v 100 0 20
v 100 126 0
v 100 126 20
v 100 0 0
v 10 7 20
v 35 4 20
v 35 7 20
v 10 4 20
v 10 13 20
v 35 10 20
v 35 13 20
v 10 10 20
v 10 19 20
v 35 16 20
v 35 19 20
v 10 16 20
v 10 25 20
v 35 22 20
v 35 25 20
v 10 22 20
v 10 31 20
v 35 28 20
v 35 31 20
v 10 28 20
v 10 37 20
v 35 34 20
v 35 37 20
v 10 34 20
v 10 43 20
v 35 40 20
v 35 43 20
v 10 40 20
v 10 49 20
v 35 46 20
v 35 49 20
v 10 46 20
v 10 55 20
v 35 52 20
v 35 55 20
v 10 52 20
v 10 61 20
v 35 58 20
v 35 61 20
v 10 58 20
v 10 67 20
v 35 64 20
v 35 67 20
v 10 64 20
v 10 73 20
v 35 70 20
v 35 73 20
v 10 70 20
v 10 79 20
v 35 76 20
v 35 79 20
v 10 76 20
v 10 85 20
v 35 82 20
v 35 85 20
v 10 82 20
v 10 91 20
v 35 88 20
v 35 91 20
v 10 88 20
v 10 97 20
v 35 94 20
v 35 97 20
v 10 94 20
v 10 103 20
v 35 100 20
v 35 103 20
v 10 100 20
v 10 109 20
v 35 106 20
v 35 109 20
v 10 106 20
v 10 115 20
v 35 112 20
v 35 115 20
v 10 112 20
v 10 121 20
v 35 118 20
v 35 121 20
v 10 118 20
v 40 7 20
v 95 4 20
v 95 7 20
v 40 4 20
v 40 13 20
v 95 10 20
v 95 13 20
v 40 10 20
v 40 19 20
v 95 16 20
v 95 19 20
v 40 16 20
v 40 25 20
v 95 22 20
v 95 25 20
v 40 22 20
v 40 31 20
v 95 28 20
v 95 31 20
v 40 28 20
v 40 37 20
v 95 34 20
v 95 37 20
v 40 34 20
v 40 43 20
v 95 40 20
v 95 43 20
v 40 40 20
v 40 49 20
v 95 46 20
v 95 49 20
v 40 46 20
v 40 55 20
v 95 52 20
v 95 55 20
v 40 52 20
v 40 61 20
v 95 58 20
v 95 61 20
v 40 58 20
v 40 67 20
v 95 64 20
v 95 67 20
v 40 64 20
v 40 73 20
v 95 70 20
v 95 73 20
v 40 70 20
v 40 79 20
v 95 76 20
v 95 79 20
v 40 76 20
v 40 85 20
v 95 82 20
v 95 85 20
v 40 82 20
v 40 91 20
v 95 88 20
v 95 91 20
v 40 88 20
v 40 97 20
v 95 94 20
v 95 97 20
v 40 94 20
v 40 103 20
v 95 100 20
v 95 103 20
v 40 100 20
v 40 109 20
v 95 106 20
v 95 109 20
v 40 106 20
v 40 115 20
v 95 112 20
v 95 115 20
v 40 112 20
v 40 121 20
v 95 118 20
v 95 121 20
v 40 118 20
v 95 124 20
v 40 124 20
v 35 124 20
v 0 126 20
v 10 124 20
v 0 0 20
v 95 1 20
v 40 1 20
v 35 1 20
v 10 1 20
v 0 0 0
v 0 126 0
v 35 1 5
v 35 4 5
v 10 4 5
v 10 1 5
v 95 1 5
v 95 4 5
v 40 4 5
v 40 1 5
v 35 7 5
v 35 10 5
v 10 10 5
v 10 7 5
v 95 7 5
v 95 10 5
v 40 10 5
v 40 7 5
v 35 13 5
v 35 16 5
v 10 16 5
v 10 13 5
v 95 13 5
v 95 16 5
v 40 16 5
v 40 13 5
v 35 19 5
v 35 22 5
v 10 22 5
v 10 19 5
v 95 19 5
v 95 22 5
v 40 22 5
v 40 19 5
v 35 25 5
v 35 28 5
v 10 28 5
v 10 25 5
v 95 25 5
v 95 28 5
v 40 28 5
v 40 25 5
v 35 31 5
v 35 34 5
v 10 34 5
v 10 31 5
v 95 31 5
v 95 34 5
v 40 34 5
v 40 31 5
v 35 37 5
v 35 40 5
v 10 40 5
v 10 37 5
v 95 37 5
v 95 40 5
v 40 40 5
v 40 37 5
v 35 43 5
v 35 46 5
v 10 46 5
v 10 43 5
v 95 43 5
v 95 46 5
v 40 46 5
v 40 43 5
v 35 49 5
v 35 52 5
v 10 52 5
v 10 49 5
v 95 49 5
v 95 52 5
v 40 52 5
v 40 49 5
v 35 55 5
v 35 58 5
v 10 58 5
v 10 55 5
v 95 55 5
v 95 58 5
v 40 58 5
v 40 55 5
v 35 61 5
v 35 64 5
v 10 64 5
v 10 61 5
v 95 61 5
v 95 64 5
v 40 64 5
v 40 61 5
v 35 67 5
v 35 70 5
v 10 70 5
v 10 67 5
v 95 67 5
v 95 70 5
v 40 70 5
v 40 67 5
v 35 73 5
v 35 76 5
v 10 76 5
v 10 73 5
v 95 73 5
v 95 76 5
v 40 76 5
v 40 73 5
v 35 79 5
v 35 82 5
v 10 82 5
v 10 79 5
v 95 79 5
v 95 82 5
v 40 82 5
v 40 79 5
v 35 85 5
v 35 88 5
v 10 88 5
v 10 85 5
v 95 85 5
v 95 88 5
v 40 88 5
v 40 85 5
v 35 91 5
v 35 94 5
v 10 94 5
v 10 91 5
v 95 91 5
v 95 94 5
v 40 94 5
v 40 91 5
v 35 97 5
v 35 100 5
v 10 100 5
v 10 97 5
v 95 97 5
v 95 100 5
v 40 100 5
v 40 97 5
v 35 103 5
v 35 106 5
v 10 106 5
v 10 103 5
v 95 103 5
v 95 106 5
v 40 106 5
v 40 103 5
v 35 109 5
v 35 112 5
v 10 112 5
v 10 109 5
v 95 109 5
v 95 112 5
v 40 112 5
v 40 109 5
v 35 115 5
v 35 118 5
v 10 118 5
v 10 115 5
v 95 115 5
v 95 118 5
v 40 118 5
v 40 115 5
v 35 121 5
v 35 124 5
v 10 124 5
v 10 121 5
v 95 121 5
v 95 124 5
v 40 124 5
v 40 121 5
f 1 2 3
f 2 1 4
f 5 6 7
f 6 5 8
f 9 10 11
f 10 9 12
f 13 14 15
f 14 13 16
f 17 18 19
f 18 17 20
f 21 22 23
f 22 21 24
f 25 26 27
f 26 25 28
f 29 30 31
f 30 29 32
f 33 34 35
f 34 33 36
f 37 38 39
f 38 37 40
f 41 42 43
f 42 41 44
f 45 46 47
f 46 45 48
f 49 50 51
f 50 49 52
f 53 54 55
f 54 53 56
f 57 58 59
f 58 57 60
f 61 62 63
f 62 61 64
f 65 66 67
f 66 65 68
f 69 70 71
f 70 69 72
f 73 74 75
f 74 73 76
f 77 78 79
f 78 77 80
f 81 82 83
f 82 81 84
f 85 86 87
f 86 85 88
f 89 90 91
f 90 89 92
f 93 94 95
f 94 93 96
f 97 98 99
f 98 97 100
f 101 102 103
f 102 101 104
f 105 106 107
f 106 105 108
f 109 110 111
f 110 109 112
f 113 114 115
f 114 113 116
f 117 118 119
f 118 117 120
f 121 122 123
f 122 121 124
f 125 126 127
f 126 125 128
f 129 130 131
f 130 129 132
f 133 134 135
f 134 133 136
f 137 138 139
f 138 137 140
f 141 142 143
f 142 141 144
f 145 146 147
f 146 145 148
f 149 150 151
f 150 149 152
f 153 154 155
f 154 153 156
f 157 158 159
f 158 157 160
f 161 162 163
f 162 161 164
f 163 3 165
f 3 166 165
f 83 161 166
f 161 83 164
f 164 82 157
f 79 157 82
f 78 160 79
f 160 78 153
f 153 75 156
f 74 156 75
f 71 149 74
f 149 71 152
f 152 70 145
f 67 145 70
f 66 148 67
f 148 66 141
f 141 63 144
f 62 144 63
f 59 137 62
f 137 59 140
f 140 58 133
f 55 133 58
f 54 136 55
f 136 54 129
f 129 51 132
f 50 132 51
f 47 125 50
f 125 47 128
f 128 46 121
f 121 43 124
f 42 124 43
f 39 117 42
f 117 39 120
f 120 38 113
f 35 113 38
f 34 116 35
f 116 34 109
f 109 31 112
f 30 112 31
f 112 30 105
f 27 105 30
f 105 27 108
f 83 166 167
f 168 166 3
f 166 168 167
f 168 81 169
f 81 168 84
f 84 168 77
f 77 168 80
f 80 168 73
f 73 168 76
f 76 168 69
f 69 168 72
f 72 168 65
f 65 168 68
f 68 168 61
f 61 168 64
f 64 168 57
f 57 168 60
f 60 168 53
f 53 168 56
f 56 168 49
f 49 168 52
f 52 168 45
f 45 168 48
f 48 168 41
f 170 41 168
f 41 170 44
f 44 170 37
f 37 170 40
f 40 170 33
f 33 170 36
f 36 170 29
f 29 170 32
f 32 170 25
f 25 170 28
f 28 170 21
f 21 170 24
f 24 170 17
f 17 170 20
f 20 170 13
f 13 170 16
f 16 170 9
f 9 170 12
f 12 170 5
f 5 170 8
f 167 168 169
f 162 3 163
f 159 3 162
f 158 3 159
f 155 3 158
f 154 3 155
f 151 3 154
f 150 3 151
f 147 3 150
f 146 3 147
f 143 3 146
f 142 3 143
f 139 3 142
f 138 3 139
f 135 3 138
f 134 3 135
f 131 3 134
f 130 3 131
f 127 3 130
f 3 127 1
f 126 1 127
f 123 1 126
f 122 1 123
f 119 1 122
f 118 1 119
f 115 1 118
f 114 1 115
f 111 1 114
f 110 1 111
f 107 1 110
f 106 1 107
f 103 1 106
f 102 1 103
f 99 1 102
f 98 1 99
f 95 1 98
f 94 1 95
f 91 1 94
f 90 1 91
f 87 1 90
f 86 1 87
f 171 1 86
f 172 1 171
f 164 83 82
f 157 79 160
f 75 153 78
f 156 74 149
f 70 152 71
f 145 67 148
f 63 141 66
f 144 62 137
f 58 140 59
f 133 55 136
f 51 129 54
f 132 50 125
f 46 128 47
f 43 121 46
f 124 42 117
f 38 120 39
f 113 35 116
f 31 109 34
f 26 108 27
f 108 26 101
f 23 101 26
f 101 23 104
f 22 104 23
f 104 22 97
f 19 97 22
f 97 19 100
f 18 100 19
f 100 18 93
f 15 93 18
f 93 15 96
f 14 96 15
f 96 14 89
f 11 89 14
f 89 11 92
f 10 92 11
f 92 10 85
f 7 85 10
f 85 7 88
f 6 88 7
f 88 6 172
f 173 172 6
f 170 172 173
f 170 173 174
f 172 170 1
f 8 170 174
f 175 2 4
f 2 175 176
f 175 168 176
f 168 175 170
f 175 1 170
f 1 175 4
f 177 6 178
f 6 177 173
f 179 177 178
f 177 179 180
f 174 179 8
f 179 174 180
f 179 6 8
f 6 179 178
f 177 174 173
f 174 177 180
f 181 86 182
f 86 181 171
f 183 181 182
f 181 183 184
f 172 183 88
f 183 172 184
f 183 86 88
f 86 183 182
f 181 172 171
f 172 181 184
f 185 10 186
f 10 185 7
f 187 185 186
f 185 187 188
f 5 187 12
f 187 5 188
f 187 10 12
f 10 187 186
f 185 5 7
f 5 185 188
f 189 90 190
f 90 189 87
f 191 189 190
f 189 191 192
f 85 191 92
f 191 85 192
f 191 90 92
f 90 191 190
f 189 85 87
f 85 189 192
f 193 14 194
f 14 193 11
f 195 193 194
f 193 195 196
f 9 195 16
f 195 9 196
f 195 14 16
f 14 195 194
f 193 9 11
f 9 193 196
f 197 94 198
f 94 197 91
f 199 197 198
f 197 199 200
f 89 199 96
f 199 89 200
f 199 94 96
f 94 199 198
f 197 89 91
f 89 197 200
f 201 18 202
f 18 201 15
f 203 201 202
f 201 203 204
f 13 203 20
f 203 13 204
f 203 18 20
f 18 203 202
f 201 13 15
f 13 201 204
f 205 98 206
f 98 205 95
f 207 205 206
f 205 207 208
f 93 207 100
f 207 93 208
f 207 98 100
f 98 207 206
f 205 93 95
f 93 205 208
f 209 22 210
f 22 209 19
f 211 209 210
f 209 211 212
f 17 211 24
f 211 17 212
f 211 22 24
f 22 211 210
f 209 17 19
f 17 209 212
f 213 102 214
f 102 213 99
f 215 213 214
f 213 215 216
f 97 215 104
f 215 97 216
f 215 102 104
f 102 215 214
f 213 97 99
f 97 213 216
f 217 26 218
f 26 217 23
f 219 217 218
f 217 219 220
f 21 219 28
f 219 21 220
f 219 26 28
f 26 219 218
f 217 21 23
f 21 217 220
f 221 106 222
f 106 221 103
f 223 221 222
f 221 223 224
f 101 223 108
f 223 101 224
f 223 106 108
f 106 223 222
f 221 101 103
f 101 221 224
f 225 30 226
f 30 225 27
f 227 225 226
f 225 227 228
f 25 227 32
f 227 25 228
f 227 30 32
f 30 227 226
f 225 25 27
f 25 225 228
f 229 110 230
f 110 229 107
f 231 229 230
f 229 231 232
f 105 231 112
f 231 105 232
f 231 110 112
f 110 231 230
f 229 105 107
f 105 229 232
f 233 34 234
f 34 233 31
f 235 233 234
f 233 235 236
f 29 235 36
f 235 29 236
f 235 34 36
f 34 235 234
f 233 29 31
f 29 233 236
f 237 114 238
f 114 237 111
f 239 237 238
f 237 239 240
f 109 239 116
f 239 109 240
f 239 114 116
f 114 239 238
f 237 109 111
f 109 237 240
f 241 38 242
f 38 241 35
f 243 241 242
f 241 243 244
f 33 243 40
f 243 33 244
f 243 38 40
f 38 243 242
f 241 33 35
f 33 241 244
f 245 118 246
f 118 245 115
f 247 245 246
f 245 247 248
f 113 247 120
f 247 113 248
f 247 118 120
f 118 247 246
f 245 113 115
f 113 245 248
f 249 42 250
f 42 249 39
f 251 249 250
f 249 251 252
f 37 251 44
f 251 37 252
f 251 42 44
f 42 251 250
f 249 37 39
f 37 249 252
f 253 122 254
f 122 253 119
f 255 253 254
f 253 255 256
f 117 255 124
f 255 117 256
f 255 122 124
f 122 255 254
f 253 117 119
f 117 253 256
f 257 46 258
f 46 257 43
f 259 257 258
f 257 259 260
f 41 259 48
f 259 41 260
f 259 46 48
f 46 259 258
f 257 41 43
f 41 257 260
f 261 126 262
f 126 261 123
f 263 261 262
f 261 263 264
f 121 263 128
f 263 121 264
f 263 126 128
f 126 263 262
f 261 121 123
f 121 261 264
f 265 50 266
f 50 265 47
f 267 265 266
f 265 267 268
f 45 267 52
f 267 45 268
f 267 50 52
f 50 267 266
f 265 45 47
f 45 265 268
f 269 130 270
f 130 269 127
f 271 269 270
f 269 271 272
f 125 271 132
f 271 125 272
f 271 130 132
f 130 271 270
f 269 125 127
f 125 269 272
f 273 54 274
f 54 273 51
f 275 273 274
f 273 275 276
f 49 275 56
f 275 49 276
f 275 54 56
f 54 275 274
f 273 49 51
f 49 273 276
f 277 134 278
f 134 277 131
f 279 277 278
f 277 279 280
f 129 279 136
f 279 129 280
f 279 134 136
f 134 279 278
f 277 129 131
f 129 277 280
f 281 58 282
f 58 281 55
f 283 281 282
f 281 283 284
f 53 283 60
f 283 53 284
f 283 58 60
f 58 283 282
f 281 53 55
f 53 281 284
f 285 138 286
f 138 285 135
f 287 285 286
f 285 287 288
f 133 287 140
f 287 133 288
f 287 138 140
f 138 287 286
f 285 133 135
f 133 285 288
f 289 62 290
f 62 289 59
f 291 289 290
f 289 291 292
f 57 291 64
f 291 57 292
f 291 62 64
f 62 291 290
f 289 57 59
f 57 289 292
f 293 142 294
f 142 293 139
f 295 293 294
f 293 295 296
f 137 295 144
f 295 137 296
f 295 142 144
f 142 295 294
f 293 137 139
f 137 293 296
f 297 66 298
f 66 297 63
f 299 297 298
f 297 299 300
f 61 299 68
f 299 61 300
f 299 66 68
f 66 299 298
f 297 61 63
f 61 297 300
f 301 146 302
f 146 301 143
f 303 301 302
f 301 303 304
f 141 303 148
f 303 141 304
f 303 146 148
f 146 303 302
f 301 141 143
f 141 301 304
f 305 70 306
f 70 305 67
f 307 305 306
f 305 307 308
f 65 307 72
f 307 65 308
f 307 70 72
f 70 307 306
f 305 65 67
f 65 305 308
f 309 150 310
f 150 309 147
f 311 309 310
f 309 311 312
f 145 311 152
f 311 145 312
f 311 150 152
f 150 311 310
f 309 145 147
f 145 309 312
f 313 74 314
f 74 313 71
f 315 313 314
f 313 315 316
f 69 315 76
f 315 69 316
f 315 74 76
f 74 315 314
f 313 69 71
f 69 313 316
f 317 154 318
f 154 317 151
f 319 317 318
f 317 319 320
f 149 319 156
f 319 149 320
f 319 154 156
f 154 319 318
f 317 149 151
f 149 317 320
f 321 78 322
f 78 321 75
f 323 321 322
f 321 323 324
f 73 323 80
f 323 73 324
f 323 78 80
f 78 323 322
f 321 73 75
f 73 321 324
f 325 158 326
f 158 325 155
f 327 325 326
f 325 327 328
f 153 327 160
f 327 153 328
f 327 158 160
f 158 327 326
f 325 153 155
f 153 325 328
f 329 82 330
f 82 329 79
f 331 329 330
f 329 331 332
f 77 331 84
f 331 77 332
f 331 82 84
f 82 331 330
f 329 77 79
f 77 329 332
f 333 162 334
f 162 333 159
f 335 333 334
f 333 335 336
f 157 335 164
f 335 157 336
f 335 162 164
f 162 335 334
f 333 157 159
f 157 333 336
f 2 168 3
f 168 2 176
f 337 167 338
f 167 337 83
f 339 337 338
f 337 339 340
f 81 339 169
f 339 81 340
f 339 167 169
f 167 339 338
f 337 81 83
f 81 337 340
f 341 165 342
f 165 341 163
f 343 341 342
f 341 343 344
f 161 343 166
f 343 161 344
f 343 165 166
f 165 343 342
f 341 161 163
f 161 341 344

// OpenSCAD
//use("text");

width = 100;
length = 6;
height = 20;

slotDepth = 15;

module slot(slotno=0)
{   
    translate([0,(slotno * length),0]){
           translate([1,1,40]) {
                linear_extrude(height = 100) {
                    text(text = slotno, size = 20);
                }
            }
        
        difference(){
            cube([width,length,height]);
            // sd card slot
            translate([10, 1, 5]){
                cube([25,3,slotDepth]);
            }
            // ID slot
            translate([40, 1, 5]){
                cube([55,3,slotDepth]);
            }
            

        }
    }
}

//slot();


for(i = [0 : 20]) {
    slot(i);
}
